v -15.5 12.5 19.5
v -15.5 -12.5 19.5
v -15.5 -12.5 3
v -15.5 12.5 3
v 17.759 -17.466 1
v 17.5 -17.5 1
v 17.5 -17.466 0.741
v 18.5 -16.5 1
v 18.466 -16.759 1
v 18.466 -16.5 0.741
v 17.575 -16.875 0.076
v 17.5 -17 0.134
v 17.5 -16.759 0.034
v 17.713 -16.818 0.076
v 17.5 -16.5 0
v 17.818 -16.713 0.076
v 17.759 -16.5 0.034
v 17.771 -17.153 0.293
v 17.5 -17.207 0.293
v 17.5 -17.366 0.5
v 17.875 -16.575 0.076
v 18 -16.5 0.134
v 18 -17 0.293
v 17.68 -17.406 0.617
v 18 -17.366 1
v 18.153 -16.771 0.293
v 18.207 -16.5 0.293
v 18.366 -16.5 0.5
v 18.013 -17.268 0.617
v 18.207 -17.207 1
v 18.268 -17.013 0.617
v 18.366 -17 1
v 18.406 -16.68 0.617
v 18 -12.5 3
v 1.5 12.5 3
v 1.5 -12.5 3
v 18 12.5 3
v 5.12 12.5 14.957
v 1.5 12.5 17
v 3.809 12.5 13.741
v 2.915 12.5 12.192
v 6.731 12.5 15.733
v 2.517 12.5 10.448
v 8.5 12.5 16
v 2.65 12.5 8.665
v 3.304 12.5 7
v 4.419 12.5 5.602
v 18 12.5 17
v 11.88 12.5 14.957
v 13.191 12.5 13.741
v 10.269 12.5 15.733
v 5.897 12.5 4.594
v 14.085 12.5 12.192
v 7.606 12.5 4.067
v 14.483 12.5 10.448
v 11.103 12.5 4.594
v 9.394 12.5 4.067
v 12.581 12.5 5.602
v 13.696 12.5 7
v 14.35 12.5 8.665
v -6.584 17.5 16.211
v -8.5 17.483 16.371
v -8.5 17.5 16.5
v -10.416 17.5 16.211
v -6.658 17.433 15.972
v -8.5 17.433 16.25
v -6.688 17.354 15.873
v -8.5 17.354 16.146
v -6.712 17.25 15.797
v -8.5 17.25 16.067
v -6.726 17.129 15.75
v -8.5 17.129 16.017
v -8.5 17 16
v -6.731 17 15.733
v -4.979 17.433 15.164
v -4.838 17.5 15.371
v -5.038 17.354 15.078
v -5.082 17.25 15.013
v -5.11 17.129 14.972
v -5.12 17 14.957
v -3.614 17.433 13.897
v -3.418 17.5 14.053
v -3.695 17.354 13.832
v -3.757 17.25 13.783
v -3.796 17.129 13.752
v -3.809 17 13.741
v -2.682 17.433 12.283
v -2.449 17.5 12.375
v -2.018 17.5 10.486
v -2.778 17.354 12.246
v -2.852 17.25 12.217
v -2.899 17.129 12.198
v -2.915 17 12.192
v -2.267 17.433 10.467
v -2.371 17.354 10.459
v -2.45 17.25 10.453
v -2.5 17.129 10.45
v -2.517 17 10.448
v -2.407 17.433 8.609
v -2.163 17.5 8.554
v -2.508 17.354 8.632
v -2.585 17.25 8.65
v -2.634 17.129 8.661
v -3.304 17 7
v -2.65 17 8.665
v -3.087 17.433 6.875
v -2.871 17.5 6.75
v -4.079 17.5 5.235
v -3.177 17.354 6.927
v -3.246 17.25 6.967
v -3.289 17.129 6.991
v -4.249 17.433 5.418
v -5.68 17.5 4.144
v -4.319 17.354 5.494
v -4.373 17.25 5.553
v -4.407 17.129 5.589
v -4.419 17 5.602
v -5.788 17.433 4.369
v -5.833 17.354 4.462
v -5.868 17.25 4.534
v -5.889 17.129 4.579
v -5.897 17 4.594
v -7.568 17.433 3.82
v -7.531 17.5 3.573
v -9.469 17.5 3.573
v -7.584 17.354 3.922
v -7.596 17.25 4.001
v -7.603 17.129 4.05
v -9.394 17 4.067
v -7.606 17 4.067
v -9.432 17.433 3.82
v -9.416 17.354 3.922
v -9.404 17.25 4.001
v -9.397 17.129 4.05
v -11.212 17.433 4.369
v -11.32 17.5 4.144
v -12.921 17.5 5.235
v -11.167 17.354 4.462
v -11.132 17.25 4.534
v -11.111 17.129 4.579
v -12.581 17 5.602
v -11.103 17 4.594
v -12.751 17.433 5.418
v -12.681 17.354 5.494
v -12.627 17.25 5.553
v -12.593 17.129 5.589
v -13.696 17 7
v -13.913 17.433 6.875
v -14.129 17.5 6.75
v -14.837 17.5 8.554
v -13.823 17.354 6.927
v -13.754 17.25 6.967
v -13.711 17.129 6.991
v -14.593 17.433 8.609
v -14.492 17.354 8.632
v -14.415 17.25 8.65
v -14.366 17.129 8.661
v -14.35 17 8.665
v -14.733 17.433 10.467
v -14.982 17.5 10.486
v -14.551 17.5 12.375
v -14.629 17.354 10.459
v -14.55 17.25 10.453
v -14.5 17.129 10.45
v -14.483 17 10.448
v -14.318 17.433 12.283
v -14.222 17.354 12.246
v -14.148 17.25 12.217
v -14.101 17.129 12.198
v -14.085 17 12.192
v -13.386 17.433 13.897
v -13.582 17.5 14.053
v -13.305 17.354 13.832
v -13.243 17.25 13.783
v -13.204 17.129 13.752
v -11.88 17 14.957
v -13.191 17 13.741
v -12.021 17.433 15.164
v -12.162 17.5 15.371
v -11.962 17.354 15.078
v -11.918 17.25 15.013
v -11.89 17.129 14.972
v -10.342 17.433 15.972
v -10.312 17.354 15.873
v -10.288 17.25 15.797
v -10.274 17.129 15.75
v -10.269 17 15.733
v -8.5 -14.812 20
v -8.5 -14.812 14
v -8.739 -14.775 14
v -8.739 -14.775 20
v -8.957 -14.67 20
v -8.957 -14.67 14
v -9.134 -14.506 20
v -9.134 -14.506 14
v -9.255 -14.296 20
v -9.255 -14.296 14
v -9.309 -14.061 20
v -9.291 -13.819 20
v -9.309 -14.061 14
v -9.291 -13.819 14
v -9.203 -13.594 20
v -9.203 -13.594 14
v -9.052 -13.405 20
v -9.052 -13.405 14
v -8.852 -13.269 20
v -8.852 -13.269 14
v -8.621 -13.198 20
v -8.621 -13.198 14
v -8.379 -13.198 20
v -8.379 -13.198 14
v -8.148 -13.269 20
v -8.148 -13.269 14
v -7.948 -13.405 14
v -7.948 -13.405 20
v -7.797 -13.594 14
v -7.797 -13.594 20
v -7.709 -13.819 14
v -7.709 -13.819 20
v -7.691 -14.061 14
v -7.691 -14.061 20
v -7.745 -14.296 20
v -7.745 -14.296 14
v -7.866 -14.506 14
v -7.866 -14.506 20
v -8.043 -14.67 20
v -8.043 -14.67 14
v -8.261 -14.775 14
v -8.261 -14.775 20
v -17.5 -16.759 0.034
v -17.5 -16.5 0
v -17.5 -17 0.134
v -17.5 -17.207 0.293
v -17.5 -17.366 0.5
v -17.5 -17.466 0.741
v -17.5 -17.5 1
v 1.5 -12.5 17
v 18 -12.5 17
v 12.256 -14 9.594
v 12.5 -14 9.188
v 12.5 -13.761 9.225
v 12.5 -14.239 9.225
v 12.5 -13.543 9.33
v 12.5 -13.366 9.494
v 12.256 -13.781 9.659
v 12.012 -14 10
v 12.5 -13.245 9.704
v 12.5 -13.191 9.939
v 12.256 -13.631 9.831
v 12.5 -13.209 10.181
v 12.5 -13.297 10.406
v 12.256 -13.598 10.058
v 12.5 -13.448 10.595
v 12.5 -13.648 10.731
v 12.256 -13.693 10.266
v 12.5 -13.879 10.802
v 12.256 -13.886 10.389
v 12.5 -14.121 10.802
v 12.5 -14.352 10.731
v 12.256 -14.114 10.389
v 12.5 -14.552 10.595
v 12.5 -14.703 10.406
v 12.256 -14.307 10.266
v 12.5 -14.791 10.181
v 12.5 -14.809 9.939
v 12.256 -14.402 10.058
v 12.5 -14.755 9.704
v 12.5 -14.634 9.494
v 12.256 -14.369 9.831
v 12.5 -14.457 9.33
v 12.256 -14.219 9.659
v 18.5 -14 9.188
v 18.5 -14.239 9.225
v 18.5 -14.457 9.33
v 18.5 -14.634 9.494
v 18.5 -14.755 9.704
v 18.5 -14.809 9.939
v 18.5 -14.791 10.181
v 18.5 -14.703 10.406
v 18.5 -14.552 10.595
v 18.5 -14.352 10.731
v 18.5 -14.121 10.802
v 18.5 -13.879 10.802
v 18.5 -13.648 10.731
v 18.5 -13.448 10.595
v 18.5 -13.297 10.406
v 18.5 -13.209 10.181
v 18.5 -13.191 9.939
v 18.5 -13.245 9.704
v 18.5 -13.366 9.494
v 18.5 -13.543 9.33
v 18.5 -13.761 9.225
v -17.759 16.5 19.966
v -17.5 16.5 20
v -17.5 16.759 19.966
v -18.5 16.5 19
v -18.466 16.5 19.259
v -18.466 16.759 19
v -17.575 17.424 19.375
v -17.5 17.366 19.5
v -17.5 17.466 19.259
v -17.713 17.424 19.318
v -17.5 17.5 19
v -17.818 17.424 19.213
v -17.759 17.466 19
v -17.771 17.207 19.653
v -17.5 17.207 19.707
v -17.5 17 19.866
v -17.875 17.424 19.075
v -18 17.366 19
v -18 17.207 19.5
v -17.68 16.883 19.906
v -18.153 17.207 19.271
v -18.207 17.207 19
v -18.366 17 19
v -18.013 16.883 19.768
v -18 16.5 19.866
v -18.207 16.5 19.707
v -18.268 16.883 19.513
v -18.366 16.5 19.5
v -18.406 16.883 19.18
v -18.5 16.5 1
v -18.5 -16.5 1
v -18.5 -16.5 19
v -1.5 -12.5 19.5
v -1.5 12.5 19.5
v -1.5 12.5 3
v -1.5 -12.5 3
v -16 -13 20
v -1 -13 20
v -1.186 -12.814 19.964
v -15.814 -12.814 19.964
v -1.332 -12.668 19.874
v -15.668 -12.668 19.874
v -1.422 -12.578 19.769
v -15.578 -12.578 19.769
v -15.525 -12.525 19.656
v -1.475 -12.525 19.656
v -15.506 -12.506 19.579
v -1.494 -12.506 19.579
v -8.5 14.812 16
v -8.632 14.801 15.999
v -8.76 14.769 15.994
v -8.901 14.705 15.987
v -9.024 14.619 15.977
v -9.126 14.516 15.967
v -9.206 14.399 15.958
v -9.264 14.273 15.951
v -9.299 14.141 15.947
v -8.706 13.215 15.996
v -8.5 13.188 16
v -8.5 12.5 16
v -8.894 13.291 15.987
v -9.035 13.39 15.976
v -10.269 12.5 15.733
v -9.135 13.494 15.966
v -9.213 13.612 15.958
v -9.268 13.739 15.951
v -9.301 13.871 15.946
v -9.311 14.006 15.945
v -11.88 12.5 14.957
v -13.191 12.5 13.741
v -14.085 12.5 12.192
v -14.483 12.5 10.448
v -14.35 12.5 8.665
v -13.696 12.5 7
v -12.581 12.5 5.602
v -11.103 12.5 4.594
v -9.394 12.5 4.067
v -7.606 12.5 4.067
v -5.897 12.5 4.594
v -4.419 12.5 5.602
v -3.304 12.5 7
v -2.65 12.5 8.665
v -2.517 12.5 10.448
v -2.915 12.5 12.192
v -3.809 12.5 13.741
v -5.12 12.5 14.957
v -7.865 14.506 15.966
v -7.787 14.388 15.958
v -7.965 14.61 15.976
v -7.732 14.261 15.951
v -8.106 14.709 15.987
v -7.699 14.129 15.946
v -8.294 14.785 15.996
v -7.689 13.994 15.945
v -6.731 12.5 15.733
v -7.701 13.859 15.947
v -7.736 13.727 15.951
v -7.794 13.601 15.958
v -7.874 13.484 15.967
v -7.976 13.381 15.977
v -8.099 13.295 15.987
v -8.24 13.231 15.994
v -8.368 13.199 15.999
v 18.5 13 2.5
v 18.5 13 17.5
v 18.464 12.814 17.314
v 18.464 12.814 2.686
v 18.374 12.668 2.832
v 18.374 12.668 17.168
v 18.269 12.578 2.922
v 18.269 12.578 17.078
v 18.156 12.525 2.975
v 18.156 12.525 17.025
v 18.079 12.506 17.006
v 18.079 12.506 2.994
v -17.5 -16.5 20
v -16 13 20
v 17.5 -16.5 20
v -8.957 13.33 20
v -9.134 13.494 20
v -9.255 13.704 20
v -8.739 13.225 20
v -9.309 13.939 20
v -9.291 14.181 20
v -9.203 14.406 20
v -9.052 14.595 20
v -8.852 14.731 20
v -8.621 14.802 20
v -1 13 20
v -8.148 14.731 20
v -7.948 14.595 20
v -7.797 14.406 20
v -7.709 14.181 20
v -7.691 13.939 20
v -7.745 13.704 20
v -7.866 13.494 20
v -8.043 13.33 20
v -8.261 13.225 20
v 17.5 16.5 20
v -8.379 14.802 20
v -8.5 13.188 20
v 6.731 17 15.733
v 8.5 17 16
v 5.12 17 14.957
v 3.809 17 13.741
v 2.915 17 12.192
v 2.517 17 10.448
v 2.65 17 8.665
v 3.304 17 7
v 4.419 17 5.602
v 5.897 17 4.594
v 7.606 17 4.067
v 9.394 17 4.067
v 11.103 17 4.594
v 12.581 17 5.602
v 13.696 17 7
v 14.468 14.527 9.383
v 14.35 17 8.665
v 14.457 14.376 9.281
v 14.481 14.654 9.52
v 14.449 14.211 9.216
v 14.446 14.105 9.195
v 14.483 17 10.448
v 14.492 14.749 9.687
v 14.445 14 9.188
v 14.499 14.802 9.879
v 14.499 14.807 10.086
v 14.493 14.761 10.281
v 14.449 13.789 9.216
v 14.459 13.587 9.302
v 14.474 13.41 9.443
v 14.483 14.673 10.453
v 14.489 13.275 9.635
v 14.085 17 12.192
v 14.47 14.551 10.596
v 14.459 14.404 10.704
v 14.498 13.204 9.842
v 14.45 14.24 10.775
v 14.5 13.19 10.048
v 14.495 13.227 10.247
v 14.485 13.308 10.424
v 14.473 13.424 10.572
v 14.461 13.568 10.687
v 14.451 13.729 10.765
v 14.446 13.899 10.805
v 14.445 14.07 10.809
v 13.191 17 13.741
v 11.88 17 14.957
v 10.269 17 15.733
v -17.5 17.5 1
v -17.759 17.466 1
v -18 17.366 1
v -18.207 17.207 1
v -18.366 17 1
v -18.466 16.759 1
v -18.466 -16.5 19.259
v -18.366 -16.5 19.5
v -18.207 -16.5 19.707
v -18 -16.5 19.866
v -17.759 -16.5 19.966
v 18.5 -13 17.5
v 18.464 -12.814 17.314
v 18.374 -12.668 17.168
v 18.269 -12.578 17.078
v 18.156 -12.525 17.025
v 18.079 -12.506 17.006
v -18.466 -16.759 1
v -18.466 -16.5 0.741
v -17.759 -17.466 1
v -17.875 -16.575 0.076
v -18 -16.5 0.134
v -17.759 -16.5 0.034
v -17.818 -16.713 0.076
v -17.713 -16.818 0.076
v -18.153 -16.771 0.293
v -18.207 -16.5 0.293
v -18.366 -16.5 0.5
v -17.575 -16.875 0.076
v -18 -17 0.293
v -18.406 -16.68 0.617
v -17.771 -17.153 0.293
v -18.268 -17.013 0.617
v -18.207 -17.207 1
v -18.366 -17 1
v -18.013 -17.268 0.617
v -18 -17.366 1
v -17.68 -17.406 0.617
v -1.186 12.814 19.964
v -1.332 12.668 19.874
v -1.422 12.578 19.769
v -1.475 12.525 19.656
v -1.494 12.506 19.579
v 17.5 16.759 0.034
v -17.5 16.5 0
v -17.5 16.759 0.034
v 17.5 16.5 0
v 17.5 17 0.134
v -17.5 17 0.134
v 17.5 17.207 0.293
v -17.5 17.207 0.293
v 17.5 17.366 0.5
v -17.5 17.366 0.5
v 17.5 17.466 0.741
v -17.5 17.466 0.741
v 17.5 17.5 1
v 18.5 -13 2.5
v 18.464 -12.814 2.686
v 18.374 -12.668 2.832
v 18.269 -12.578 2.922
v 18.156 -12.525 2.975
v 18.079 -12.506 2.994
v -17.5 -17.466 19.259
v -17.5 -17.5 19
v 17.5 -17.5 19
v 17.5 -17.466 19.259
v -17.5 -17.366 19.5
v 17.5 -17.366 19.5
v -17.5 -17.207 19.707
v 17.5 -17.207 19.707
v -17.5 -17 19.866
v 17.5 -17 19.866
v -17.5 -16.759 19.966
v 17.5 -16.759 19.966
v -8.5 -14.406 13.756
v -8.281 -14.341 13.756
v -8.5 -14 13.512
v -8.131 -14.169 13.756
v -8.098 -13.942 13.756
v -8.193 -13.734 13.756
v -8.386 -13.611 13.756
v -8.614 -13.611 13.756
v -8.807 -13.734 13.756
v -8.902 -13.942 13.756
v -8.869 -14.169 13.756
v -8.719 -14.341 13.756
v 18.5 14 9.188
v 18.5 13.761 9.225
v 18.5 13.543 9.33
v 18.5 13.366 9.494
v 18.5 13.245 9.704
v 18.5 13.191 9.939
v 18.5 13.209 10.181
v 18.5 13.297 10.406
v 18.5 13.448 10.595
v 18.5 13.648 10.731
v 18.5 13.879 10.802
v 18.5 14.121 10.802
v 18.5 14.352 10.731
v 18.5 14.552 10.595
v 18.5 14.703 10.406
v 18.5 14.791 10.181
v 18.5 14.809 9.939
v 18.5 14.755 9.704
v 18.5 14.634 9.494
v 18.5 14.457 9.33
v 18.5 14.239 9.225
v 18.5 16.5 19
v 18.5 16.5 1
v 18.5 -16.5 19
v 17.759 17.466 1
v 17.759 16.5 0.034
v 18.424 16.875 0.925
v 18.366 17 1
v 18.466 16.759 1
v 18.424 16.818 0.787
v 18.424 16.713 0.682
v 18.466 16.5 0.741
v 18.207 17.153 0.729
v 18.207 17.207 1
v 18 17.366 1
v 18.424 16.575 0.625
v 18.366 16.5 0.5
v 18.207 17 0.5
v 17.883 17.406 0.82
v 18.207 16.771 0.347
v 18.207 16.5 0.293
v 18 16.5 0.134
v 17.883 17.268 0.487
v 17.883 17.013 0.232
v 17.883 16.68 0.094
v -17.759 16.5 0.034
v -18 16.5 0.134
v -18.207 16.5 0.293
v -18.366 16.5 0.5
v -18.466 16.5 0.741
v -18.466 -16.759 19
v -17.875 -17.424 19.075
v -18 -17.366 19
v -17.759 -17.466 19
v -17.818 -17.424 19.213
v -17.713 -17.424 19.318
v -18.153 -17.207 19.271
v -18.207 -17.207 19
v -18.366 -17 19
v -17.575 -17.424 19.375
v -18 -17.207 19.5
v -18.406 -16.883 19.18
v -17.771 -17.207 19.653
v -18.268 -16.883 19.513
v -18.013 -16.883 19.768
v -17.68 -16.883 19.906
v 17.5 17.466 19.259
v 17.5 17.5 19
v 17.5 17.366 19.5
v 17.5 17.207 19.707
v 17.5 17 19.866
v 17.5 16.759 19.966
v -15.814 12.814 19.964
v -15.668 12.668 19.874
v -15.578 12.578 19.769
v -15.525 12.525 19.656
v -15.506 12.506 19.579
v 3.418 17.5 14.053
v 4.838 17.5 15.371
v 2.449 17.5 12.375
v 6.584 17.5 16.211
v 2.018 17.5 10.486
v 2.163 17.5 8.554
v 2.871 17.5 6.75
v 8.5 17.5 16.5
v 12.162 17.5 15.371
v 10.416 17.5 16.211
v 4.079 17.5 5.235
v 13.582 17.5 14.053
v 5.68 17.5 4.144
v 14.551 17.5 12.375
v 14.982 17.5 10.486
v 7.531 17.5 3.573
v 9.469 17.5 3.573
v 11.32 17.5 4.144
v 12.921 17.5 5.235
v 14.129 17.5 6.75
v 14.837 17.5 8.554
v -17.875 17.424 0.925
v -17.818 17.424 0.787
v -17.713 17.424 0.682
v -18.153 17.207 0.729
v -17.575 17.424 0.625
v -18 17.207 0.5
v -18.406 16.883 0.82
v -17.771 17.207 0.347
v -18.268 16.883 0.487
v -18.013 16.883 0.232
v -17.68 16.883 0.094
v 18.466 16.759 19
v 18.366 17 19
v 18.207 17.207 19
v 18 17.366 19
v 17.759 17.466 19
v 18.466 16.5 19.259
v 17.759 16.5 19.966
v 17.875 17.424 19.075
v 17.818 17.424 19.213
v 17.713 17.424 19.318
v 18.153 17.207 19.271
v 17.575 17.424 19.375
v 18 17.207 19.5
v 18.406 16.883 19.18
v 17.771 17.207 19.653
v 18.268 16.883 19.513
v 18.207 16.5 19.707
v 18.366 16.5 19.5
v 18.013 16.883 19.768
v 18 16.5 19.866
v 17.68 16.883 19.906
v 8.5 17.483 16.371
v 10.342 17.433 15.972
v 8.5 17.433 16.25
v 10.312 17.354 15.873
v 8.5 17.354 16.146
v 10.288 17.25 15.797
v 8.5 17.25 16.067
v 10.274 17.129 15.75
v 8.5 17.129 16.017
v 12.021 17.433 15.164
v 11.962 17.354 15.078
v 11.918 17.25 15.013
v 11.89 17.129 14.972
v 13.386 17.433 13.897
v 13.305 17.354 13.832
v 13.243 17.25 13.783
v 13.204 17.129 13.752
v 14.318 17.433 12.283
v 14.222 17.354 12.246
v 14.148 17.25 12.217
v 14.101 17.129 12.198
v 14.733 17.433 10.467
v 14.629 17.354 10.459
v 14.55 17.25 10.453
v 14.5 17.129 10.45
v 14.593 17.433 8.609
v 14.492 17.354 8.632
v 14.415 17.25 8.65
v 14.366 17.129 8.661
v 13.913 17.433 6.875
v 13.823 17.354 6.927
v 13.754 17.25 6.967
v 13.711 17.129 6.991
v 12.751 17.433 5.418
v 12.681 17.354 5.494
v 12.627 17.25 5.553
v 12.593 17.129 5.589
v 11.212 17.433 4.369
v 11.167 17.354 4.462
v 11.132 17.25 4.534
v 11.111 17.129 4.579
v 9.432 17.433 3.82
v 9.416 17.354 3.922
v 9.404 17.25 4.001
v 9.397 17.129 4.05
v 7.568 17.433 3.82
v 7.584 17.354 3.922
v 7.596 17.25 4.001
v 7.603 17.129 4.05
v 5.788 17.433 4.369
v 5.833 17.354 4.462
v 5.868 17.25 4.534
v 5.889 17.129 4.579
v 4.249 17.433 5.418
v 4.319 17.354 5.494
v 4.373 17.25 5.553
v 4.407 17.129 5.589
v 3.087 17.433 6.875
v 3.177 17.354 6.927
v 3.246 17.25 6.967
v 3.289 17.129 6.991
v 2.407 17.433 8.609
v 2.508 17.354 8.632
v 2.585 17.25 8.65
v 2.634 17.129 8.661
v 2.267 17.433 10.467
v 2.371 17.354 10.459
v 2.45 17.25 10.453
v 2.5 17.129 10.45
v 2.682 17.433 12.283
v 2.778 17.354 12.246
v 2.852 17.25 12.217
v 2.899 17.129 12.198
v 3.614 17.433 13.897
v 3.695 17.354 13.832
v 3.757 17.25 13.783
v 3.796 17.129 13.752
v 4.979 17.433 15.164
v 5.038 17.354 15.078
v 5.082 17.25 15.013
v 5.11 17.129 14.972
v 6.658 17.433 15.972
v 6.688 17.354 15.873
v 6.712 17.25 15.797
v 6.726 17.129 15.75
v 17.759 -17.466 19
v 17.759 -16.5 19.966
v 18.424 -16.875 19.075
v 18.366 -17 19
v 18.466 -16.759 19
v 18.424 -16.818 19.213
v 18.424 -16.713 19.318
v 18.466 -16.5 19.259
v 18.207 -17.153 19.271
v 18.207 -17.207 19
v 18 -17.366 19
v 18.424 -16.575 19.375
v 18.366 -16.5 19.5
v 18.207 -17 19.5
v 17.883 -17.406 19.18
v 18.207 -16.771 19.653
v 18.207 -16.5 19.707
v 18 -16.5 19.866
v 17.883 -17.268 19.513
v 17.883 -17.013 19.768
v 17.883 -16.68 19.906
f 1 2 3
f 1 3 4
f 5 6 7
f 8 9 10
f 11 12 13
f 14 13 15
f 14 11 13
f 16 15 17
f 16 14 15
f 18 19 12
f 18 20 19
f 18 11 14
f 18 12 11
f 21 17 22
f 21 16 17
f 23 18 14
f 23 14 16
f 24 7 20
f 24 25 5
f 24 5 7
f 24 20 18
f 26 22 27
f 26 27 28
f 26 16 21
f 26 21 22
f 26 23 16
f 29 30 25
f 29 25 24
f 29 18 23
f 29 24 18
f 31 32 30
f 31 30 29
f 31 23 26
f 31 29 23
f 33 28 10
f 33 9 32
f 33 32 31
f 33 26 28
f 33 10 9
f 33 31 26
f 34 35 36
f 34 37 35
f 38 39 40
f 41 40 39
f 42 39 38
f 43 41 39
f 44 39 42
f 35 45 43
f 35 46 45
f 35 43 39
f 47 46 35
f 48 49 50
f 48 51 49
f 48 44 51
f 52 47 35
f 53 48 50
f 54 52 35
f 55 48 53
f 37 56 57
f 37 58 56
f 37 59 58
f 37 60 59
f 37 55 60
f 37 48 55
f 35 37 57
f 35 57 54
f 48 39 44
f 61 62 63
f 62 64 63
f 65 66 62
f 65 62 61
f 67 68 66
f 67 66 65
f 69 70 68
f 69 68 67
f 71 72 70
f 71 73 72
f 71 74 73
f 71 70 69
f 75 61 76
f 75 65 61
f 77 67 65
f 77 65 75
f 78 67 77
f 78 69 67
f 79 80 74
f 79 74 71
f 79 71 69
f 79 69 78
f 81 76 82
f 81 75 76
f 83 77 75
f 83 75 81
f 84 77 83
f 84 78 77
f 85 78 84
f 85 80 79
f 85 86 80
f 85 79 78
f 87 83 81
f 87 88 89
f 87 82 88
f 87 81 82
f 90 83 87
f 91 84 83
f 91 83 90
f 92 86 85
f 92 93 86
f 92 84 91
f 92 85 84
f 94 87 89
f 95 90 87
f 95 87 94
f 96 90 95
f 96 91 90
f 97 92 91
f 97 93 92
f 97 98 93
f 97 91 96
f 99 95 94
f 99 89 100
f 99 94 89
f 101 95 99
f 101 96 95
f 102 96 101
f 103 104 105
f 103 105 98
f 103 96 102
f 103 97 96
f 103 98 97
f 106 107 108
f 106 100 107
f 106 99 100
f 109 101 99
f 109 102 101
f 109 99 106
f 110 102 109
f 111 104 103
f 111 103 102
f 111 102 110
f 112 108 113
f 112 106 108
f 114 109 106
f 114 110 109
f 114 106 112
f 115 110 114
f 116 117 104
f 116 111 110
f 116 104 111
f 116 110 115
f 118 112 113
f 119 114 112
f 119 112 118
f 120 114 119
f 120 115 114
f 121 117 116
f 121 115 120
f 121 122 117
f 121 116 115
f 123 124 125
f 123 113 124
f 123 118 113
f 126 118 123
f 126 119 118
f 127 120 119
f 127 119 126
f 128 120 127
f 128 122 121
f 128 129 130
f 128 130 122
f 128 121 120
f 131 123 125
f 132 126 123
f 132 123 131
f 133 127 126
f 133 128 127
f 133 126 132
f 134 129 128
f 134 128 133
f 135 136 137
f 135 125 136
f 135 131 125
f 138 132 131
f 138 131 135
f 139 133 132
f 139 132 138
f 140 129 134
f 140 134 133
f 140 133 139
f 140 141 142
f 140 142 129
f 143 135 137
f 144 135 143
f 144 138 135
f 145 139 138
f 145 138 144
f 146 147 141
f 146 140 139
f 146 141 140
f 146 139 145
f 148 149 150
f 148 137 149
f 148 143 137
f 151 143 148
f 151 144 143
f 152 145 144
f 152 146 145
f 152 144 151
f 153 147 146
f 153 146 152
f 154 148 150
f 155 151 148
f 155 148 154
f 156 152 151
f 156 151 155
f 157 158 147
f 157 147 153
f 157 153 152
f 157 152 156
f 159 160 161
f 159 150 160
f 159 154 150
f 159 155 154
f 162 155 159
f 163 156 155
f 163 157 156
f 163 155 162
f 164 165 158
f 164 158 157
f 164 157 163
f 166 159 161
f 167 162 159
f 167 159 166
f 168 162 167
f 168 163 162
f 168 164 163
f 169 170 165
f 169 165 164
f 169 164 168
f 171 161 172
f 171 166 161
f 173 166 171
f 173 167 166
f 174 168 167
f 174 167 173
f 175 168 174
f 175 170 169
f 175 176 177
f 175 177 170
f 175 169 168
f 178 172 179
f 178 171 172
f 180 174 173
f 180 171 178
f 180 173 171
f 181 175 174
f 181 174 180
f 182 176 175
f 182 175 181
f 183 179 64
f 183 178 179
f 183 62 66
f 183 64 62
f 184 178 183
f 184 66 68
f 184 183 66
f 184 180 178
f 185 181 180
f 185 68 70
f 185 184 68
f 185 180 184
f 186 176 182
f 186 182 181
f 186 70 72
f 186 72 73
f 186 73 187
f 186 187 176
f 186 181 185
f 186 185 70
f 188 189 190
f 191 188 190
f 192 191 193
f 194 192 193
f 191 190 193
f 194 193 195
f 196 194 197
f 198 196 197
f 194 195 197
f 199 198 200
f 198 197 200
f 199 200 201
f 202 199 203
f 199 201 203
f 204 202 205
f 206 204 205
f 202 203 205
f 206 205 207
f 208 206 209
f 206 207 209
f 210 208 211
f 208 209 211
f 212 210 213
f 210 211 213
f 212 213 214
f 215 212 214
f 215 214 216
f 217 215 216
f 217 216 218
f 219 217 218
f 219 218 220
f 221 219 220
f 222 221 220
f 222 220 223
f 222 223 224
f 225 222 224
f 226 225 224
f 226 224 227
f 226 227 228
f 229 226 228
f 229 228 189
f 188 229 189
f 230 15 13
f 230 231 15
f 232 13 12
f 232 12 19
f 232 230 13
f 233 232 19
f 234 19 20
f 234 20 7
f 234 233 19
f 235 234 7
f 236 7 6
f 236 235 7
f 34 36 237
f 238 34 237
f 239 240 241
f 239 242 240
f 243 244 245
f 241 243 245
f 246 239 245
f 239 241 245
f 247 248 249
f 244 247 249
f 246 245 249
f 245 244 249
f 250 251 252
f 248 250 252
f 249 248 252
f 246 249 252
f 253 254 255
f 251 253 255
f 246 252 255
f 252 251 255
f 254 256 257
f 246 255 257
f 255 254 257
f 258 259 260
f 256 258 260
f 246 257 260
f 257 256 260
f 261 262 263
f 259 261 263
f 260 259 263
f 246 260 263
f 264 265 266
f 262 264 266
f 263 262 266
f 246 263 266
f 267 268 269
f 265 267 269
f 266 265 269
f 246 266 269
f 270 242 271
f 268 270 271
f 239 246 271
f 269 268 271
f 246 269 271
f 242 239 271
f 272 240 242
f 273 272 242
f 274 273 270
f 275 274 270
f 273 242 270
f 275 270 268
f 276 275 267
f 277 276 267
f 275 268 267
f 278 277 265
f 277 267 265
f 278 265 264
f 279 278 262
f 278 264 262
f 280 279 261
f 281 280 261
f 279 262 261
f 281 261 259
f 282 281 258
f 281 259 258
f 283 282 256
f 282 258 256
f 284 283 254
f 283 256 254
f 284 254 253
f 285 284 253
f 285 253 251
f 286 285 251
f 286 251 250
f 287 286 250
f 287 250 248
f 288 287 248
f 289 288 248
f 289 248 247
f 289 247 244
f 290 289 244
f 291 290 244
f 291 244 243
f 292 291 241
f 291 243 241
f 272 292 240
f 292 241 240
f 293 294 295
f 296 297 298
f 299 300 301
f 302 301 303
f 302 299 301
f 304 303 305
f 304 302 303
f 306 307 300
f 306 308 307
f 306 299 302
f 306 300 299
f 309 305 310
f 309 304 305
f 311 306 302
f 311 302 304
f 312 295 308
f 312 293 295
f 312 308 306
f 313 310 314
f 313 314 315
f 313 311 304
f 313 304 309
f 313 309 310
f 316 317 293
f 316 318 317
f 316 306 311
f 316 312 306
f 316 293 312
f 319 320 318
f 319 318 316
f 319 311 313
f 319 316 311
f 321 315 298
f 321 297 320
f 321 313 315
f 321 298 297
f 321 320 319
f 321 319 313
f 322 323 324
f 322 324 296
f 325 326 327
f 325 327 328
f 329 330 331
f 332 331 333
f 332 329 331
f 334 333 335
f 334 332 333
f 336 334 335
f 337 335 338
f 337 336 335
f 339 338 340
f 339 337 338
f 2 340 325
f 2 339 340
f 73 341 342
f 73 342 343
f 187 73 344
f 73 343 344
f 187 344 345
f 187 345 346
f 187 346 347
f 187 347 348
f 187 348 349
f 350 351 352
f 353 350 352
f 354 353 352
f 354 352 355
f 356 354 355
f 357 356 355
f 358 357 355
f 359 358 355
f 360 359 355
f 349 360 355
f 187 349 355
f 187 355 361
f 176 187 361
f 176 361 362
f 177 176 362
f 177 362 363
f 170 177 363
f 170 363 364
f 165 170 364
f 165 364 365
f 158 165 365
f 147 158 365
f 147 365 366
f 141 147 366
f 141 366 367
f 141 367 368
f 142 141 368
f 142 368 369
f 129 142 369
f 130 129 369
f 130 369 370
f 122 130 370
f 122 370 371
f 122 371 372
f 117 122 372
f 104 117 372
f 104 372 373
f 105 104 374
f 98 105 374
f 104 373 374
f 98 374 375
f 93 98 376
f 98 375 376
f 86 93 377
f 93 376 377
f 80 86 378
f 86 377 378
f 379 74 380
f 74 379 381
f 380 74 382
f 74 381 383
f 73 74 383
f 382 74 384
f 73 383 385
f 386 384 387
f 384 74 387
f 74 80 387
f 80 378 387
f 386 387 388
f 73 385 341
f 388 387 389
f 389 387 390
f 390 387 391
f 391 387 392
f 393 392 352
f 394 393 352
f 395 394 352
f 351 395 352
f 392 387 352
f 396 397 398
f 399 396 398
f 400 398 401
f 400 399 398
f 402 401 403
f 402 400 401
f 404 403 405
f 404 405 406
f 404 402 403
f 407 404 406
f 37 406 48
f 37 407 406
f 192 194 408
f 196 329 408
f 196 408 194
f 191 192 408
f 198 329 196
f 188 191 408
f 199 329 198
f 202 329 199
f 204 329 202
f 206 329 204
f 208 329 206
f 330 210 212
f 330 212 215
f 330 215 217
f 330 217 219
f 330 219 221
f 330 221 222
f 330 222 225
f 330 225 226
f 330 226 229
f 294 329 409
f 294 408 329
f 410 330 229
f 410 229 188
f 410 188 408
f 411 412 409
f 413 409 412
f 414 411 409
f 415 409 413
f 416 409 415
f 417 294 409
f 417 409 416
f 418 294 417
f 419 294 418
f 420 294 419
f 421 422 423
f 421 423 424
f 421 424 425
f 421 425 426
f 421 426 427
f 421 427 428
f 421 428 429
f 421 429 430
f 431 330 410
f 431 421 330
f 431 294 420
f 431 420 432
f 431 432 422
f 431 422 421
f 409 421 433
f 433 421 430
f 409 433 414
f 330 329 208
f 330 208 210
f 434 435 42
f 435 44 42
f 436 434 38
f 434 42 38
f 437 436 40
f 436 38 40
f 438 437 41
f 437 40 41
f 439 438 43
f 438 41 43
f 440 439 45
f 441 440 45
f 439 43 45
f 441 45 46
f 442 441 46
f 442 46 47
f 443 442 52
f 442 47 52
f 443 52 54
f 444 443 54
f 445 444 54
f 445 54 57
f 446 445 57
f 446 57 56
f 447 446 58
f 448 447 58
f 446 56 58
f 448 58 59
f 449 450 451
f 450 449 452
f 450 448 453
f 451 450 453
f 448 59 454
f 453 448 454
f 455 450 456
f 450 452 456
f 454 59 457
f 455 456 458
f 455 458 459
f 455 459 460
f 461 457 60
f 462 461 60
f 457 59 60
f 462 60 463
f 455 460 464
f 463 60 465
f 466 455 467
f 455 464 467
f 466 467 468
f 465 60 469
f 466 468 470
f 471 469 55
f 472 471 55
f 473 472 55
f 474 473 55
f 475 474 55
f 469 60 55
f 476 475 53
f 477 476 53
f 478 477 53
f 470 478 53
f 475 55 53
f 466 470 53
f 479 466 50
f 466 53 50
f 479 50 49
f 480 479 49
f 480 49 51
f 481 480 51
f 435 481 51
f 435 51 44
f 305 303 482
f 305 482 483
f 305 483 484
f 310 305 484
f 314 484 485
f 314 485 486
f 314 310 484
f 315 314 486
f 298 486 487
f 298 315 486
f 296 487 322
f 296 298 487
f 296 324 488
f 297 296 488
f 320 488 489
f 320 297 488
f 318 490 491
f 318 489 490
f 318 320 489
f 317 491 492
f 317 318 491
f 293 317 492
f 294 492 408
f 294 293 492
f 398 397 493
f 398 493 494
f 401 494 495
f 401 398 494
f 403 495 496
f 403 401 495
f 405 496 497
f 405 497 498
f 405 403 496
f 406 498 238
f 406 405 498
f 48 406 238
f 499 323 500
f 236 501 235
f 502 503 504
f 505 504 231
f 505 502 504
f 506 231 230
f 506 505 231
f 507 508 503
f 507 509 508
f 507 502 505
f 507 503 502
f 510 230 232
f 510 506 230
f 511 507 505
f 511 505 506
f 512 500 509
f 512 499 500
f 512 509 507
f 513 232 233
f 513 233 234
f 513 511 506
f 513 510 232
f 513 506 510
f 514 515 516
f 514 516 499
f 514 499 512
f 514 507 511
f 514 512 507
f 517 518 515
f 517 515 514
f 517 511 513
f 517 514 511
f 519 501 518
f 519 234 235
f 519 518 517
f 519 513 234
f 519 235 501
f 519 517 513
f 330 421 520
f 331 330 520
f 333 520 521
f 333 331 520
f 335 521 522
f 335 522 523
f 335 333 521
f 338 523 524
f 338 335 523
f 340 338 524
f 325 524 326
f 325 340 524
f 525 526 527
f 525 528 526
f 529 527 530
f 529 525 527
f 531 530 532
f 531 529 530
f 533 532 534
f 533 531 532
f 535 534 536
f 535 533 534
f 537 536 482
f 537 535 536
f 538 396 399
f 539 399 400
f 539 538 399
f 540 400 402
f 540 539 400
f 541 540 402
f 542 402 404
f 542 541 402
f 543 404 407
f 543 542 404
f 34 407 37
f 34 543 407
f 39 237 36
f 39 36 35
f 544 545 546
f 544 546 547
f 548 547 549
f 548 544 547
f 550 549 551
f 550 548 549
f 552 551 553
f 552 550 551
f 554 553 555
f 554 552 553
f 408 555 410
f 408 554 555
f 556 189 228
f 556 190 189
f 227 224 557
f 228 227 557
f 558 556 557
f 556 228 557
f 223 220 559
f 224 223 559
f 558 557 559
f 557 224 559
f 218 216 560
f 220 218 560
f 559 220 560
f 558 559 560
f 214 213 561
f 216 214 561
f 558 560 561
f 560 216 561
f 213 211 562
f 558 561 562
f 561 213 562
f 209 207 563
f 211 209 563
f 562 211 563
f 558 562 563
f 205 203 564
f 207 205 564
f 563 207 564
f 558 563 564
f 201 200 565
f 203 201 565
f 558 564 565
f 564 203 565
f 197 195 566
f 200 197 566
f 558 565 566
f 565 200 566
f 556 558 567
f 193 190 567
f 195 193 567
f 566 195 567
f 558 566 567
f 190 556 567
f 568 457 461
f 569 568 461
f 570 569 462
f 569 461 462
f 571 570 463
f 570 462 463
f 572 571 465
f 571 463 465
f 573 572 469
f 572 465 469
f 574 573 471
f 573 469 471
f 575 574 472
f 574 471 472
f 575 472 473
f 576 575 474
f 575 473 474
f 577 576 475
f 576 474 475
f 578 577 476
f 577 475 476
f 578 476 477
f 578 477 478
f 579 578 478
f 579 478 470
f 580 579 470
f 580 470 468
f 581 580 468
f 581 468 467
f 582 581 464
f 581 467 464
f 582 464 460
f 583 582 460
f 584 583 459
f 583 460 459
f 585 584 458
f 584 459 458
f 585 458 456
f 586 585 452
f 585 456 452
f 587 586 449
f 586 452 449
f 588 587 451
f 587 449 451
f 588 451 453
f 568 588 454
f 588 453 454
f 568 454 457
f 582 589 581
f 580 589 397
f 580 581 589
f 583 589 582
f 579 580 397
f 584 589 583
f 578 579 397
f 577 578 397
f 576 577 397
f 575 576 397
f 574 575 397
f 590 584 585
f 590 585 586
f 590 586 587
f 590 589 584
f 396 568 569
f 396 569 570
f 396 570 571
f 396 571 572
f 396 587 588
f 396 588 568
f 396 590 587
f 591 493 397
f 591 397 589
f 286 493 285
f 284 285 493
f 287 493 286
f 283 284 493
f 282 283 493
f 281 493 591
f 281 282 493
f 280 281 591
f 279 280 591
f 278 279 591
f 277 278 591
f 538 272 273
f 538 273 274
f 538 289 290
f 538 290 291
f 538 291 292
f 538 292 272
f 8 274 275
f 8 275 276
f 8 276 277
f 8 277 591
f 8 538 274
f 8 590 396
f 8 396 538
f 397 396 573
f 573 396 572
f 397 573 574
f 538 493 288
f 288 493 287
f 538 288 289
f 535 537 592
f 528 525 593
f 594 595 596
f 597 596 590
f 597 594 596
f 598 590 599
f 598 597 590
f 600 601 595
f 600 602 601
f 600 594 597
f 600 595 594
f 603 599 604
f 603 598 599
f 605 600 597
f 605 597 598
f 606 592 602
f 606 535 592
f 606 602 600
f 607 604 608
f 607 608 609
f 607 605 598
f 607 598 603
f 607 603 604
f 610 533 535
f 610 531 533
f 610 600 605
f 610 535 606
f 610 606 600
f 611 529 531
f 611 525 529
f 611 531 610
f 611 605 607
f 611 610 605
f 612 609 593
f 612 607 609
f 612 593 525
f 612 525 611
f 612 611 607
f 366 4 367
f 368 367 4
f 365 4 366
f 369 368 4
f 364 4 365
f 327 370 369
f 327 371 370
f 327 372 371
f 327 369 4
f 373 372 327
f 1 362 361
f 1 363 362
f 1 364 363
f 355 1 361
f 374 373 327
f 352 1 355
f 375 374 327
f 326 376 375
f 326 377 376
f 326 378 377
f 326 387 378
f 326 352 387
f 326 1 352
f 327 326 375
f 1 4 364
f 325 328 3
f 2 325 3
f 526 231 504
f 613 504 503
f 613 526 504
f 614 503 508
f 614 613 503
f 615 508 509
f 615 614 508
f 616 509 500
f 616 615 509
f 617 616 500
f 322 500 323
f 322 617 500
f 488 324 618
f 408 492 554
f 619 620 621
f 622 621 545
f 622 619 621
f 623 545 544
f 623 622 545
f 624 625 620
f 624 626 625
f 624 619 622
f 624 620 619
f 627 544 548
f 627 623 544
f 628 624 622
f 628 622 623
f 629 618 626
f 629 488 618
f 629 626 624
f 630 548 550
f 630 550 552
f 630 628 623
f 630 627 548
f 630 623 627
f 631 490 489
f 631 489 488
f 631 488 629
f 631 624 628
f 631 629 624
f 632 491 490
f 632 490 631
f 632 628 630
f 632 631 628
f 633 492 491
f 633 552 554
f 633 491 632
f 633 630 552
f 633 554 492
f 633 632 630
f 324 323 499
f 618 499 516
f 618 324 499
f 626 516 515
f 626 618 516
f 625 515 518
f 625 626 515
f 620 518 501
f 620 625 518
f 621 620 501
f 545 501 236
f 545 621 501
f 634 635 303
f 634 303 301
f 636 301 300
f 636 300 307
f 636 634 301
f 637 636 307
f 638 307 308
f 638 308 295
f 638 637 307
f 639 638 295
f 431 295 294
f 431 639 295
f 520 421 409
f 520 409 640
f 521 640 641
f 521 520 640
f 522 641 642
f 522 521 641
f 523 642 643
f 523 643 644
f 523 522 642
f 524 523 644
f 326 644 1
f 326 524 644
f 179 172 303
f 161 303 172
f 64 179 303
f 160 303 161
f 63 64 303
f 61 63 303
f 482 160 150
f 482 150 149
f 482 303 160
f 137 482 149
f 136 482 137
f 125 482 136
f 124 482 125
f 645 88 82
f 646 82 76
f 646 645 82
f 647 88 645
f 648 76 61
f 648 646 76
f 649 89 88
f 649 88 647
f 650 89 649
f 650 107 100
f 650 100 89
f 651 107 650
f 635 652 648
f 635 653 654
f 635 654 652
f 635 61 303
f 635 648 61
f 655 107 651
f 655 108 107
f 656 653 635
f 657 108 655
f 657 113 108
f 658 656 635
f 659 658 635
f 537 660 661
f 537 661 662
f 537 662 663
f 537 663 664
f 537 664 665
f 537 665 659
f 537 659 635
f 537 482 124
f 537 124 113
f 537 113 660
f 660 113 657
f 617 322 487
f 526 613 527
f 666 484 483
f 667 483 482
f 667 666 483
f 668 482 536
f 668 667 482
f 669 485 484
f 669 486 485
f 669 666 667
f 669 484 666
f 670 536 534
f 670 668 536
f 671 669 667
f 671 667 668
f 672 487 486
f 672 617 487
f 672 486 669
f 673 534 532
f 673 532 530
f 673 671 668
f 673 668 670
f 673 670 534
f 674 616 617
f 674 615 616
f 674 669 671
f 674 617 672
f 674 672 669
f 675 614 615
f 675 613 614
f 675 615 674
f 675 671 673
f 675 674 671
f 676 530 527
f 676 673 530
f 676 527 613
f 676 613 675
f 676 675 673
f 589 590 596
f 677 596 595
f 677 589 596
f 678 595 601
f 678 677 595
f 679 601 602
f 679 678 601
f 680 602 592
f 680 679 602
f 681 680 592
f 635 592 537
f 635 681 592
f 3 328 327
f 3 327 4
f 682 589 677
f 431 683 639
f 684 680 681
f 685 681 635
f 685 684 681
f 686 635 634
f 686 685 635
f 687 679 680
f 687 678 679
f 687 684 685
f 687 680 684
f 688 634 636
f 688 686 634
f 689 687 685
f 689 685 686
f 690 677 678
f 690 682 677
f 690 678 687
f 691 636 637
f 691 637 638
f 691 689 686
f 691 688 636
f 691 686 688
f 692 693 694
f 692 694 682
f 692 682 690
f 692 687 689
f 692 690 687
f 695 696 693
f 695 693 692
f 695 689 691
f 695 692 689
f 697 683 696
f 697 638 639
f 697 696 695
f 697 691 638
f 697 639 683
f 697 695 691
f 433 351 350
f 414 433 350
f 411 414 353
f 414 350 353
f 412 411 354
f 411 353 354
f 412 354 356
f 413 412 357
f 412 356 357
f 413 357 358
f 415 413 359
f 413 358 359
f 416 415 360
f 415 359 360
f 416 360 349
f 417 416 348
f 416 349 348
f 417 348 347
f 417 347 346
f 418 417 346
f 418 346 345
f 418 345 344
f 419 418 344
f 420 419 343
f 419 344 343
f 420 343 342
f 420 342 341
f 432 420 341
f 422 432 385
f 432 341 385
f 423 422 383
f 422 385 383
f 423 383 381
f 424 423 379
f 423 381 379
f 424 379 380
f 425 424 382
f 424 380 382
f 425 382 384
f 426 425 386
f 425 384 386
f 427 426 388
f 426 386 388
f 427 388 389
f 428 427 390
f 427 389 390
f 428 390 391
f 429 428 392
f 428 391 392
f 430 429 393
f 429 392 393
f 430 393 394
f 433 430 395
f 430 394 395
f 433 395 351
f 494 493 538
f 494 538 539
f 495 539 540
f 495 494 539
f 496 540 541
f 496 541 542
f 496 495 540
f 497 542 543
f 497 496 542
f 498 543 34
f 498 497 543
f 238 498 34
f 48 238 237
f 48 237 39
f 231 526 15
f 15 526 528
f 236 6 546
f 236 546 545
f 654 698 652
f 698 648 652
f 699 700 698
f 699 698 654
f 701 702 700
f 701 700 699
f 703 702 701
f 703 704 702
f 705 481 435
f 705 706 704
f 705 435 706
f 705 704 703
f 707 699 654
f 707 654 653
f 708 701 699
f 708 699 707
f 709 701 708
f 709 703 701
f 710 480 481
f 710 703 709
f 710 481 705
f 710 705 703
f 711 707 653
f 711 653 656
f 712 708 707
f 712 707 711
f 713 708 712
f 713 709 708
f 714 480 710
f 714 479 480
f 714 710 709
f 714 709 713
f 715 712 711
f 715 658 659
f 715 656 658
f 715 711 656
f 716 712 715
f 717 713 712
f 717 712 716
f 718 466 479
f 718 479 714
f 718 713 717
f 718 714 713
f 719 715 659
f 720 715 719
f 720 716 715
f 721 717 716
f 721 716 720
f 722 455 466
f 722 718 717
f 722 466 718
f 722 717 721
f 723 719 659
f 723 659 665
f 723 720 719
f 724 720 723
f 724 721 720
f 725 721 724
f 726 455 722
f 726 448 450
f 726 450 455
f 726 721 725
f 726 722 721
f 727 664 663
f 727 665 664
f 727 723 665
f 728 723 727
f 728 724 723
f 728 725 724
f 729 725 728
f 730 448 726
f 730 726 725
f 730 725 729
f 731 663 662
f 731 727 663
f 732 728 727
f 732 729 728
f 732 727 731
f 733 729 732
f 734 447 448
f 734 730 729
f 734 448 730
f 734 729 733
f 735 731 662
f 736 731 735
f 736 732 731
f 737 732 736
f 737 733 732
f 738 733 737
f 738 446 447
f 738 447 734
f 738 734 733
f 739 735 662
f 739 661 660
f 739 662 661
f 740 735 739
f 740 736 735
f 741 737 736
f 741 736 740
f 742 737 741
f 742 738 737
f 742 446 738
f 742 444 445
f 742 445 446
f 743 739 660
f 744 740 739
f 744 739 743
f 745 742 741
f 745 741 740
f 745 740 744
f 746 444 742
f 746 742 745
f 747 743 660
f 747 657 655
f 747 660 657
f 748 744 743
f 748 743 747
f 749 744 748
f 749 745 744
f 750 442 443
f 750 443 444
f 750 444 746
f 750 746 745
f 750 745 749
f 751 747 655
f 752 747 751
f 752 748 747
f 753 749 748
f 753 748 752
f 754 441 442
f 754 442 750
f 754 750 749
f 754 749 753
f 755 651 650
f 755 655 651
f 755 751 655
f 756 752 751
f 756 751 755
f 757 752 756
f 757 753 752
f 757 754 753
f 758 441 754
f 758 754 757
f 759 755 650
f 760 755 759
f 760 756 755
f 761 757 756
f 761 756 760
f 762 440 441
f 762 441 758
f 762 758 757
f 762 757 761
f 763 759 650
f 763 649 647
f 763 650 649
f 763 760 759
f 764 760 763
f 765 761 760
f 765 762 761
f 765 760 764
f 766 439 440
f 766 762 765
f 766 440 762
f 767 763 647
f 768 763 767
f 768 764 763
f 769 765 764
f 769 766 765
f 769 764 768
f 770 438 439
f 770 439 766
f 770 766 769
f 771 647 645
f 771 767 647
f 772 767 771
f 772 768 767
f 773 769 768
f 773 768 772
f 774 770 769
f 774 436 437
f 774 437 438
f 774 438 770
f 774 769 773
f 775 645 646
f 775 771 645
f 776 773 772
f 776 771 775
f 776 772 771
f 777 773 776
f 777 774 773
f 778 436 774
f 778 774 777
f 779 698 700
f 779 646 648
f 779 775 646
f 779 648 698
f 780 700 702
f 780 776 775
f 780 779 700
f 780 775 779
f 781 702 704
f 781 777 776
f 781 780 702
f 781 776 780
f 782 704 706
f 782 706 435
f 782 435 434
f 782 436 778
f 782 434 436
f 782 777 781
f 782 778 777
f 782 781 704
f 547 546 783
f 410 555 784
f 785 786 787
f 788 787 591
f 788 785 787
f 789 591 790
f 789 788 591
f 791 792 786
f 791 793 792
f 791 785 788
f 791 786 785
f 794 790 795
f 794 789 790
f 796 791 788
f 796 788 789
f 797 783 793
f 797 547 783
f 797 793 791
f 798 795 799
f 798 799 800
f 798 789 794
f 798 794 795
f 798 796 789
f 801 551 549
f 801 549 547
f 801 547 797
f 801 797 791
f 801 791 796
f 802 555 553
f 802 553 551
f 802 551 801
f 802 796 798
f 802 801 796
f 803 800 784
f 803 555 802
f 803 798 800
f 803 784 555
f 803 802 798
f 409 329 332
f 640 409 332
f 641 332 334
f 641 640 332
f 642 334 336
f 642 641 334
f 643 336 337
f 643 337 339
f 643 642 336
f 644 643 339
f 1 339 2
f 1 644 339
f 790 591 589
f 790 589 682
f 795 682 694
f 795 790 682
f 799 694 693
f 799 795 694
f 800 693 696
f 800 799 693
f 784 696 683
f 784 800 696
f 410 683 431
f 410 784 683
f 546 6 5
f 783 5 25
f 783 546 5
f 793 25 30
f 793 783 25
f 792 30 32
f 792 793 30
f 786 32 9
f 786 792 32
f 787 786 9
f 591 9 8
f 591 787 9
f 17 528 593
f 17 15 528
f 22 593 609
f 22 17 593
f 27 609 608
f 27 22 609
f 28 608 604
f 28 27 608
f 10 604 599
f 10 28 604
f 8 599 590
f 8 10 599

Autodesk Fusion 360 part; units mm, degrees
sketch "Sketch1" plane through (0, 0, 0) normal (0, 0, 1) x (1, 0, 0)
  line L0 (18.5, -17.5) -> (-18.5, -17.5)
  line L1 (-18.5, -17.5) -> (-18.5, 17.5)
  line L2 (-18.5, 17.5) -> (18.5, 17.5)
  line L3 (18.5, 17.5) -> (18.5, -17.5)
  line L4 (18.5, -17.5) -> (-18.5, 17.5) construction
  line L5 (-18.5, -17.5) -> (18.5, 17.5) construction
  dimension "d1" = 35
  dimension "d2" = 37
extrude "Extrude1" add sketch "Sketch1" along normal blind 20
sketch "Sketch4" plane through (18.5, 0, 0) normal (1, 0, 0) x (0, 1, 0)
  line L0 (-17.5, 0) -> (17.5, 0)
  line L1 (17.5, 0) -> (17.5, 20)
  line L2 (17.5, 20) -> (-17.5, 20)
  line L3 (-17.5, 20) -> (-17.5, 0)
  line L4 (12.5, 3) -> (-12.5, 3)
  line L5 (-12.5, 3) -> (-12.5, 17)
  line L6 (-12.5, 17) -> (12.5, 17)
  line L7 (12.5, 17) -> (12.5, 3)
  line L8 (12.5, 3) -> (-12.5, 17) construction
  line L9 (-12.5, 3) -> (12.5, 17) construction
  point P0 (0, 10)
  dimension "d39" = 25
  dimension "d40" = 14
  dimension "d41" = 10
extrude "Extrude3" cut sketch "Sketch4" against normal blind 17 contours L4 L5 L6 L7
sketch "Sketch5" plane through (18.5, 0, 0) normal (1, 0, 0) x (0, 1, 0)
  line L0 (-12.5, 3) -> (-12.5, 17)
  line L1 (-12.5, 17) -> (12.5, 17)
  line L2 (12.5, 17) -> (12.5, 3)
  line L3 (12.5, 3) -> (-12.5, 3)
  line L4 (-17.5, 0) -> (17.5, 0)
  line L5 (17.5, 0) -> (17.5, 20)
  line L6 (17.5, 20) -> (-17.5, 20)
  line L7 (-17.5, 20) -> (-17.5, 0)
  point P0 (-14, 10)
  point P1 (14, 10)
  dimension "d44" = 1.5
  dimension "d45" = 1.5
  dimension "d46" = 10
  dimension "d47" = 10
hole "Hole3" at (18.5, -14, 10) at (18.5, 14, 10) direction (-1, 0, 0) diameter 1.623 depth 6 tip angle 118
hole "Hole4" at (8.5, 17.5, 10) direction (0, -1, 0) diameter 12 depth 5 tip angle 180
sketch "Sketch6" plane through (0, 0, 20) normal (0, 0, 1) x (-1, 0, 0)
  line L0 (-18.5, -17.5) -> (18.5, -17.5)
  line L1 (18.5, -17.5) -> (18.5, 17.5)
  line L2 (18.5, 17.5) -> (-18.5, 17.5)
  line L3 (-18.5, 17.5) -> (-18.5, -17.5)
  line L4 (15.5, -12.5) -> (1.5, -12.5)
  line L5 (1.5, -12.5) -> (1.5, 12.5)
  line L6 (1.5, 12.5) -> (15.5, 12.5)
  line L7 (15.5, 12.5) -> (15.5, -12.5)
  point P0 (15.5, 0)
  dimension "d58" = 14
  dimension "d59" = 25
  dimension "d60" = 20
  dimension "d61" = 17.5
extrude "Extrude4" cut sketch "Sketch6" against normal blind 17 contours L4 L5 L6 L7
sketch "Sketch7" plane through (0, 0, 20) normal (0, 0, 1) x (-1, 0, 0)
  line L0 (1.5, -12.5) -> (1.5, 12.5)
  line L1 (1.5, 12.5) -> (15.5, 12.5)
  line L2 (15.5, 12.5) -> (15.5, -12.5)
  line L3 (15.5, -12.5) -> (1.5, -12.5)
  line L4 (-18.5, -17.5) -> (18.5, -17.5)
  line L5 (18.5, -17.5) -> (18.5, 17.5)
  line L6 (18.5, 17.5) -> (-18.5, 17.5)
  line L7 (-18.5, 17.5) -> (-18.5, -17.5)
  point P0 (8.5, 14)
  point P1 (8.5, -14)
  dimension "d64" = 1.5
  dimension "d65" = 1.5
  dimension "d66" = 7
  dimension "d67" = 7
hole "Hole5" at (-8.5, -14, 20) at (-8.5, 14, 20) direction (0, 0, -1) diameter 1.623 depth 6 tip angle 118
hole "Hole6" at (-8.5, 17.5, 10) direction (0, -1, 0) diameter 12 depth 5 tip angle 180
fillet "Fillet3" radius 0.5 10 edges at (18.5, -12.5, 10) (18.5, 0, 17) (18.5, 12.5, 10) (18.5, 0, 3) (10.6697, 17.5, 4.406) (-6.3303, 17.5, 4.406) (-1.5, 0, 20) (-8.5, 12.5, 20) (-15.5, 0, 20) (-8.5, -12.5, 20)
fillet "Fillet4" radius 1 12 edges at (-18.5, 0, 20) (0, -17.5, 20) (-18.5, -17.5, 10) (18.5, 0, 20) (0, 17.5, 20) (18.5, -17.5, 10) (0, -17.5, 0) (-18.5, 0, 0) (-18.5, 17.5, 10) (0, 17.5, 0) (18.5, 17.5, 10) (18.5, 0, 0)
